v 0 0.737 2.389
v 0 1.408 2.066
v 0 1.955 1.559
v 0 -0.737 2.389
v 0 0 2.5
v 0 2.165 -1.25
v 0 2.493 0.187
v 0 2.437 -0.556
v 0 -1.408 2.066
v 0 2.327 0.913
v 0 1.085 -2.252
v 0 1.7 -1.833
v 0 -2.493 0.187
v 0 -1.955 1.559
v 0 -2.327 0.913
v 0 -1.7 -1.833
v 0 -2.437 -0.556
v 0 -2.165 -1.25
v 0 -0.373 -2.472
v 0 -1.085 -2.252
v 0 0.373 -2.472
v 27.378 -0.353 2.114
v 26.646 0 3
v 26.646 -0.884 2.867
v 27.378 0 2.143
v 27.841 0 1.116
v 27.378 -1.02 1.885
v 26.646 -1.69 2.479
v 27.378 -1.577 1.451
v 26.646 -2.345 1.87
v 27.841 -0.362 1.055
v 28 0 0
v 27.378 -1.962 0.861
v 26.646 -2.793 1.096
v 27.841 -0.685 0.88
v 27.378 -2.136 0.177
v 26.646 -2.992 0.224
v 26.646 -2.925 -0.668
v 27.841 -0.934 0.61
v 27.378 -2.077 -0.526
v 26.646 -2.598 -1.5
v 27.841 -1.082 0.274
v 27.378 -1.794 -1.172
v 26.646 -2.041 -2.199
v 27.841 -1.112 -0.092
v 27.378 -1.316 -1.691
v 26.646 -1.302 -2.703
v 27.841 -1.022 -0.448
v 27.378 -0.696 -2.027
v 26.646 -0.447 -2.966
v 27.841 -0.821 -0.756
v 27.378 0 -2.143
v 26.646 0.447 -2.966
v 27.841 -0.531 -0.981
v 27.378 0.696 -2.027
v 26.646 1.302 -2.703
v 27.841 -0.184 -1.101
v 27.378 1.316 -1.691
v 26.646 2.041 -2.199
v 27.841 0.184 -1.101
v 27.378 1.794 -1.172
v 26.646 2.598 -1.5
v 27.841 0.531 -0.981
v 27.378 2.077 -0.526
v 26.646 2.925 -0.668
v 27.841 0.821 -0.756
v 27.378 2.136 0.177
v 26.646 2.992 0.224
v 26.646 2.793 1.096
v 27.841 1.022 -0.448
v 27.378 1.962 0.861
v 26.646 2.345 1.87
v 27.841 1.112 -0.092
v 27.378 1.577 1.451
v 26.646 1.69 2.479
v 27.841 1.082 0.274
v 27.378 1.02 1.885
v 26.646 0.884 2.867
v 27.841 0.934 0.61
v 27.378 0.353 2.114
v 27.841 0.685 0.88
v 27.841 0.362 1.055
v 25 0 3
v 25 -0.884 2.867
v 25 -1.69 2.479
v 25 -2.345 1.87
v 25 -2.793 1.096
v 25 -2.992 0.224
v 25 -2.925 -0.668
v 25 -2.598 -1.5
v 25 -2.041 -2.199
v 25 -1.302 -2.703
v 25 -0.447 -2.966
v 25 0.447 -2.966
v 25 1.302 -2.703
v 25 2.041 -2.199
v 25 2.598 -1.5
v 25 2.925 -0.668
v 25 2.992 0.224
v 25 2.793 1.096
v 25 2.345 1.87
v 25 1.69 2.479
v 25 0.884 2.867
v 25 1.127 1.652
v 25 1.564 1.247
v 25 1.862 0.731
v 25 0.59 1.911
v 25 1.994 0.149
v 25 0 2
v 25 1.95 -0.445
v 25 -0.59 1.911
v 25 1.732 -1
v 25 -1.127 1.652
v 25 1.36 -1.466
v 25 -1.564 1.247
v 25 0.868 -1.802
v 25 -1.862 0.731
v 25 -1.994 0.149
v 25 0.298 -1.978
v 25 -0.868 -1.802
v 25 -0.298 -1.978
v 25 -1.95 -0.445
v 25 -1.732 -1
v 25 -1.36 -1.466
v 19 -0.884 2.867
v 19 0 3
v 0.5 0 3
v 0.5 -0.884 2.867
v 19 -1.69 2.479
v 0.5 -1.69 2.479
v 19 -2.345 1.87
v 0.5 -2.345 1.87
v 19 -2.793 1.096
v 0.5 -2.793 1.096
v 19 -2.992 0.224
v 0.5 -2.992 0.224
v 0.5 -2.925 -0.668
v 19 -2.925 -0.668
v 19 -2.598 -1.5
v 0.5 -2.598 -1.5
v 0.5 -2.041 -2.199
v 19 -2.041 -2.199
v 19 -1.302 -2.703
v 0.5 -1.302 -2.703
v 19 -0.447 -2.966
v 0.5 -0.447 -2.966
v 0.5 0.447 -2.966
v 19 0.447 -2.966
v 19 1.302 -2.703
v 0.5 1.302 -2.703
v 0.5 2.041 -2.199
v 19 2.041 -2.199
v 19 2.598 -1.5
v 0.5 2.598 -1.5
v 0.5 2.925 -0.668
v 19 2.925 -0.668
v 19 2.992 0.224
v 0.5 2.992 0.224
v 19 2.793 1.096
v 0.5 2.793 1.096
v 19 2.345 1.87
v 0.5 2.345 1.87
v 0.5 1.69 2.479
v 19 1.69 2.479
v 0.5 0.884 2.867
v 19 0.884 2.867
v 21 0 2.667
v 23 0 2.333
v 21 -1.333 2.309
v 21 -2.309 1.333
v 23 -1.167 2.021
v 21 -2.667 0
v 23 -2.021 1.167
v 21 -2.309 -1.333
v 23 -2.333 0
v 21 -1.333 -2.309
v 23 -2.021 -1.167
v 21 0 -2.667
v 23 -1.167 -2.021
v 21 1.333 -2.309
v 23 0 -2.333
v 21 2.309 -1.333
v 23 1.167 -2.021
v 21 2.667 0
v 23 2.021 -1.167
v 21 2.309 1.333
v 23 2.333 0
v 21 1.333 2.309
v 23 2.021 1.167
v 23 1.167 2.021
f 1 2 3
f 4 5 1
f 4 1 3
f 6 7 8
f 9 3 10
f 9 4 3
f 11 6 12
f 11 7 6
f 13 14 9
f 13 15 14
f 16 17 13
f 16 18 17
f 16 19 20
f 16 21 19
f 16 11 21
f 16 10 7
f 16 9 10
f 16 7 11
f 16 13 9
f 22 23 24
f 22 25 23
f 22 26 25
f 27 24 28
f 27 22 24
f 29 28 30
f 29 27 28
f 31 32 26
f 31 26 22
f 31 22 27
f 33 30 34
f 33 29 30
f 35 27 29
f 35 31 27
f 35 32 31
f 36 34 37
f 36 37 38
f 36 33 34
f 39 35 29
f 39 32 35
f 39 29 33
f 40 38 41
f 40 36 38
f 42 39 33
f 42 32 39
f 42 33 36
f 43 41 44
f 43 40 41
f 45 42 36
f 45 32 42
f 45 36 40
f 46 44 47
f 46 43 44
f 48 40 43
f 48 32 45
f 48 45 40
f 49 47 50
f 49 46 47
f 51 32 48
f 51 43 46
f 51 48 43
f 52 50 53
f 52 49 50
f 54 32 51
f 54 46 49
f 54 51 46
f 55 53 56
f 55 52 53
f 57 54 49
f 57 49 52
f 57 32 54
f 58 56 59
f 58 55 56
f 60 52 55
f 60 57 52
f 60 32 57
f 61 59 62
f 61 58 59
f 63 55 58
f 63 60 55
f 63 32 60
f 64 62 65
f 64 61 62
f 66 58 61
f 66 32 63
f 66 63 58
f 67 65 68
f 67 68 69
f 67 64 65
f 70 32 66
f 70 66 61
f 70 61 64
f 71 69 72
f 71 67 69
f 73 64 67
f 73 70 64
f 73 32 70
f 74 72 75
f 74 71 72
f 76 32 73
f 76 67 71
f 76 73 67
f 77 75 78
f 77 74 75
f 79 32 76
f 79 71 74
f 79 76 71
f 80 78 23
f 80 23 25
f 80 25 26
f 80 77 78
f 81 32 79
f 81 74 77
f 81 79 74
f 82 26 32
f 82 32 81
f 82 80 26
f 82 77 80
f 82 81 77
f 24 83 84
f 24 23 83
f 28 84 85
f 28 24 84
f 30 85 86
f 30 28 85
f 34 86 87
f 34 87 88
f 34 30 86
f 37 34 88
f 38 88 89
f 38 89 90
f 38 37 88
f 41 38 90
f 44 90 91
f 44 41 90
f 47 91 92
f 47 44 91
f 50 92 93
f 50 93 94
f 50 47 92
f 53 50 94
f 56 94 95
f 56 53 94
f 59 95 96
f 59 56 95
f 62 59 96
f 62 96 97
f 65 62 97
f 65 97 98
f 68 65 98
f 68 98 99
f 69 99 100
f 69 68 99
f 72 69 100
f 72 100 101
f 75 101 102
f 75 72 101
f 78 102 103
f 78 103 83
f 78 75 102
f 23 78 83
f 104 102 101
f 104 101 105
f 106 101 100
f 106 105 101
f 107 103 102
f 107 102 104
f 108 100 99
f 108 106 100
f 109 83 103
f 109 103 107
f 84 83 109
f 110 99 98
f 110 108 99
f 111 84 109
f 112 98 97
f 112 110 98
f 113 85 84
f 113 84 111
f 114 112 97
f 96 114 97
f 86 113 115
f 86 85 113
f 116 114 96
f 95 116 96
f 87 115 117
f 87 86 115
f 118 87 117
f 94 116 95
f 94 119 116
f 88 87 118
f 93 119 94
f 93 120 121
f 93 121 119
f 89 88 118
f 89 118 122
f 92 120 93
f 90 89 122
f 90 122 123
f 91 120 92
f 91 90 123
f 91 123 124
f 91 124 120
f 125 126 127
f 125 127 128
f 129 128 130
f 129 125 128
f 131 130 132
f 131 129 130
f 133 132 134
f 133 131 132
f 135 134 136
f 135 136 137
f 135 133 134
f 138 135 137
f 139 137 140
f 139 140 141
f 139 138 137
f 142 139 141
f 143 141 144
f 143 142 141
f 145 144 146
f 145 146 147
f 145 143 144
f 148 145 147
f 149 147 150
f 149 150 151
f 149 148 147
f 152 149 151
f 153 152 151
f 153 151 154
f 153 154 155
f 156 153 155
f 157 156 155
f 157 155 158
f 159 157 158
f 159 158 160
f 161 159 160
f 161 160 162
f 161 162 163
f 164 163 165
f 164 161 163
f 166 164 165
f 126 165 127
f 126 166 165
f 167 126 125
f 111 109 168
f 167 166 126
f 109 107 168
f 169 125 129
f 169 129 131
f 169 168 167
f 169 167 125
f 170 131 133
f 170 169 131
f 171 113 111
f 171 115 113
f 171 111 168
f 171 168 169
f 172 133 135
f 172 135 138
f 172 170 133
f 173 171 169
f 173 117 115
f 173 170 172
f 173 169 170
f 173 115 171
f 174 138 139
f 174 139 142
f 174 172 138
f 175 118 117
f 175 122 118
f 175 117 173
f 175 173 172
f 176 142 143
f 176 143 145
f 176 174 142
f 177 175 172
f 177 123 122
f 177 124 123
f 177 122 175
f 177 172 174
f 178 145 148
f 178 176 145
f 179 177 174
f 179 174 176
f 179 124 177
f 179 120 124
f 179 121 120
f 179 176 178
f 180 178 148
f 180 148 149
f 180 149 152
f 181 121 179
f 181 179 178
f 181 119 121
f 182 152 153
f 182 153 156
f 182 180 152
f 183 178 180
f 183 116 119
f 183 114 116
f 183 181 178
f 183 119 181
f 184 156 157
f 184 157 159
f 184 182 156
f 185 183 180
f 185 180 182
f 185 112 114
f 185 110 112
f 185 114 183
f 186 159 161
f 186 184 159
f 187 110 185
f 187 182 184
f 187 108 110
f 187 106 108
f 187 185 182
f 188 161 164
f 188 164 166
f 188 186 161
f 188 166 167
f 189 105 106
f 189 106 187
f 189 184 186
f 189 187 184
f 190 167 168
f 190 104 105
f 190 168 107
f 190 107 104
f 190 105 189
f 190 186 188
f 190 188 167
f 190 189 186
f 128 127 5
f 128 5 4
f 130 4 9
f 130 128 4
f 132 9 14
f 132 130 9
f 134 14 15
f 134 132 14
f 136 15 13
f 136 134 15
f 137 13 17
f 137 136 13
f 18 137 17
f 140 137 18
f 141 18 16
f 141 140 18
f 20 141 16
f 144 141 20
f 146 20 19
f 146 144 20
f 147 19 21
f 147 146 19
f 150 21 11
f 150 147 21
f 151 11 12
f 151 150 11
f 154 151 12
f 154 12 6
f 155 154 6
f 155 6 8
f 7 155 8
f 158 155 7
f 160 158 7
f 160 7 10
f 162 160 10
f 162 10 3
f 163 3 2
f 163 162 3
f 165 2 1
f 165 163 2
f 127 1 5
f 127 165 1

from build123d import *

# Parameters (mm, degrees)
CHANFREIN1_SIZE = 0.5


with BuildPart() as part:
    # Esquisse1 → Base-Révolution (revolve)
    with BuildSketch(Plane.XY, mode=Mode.PRIVATE) as base_r_volution_sk:
        with BuildLine():
            Line((0, 0), (0, 3))
            Line((0, 3), (19, 3))
            Line((19, 3), (25, 2))
            Line((25, 2), (25, 3))
            Line((25, 3), (26.645751311, 3))
            ThreePointArc((26.645751311, 3), (27.645751311, 1.645751311), (28, 0))
            Line((28, 0), (0, 0))
        make_face()
    revolve(base_r_volution_sk.sketch.rotate(Axis((0, 0, 0), (1, 0, 0)), 90), axis=Axis((0, 0, 0), (1, 0, 0)))

    # Chanfrein1
    chanfrein1_edges = [part.edges().sort_by_distance(p)[0] for p in [
        (0, 0, -3),
    ]]
    chamfer(chanfrein1_edges, length=CHANFREIN1_SIZE)


solid = part.part
